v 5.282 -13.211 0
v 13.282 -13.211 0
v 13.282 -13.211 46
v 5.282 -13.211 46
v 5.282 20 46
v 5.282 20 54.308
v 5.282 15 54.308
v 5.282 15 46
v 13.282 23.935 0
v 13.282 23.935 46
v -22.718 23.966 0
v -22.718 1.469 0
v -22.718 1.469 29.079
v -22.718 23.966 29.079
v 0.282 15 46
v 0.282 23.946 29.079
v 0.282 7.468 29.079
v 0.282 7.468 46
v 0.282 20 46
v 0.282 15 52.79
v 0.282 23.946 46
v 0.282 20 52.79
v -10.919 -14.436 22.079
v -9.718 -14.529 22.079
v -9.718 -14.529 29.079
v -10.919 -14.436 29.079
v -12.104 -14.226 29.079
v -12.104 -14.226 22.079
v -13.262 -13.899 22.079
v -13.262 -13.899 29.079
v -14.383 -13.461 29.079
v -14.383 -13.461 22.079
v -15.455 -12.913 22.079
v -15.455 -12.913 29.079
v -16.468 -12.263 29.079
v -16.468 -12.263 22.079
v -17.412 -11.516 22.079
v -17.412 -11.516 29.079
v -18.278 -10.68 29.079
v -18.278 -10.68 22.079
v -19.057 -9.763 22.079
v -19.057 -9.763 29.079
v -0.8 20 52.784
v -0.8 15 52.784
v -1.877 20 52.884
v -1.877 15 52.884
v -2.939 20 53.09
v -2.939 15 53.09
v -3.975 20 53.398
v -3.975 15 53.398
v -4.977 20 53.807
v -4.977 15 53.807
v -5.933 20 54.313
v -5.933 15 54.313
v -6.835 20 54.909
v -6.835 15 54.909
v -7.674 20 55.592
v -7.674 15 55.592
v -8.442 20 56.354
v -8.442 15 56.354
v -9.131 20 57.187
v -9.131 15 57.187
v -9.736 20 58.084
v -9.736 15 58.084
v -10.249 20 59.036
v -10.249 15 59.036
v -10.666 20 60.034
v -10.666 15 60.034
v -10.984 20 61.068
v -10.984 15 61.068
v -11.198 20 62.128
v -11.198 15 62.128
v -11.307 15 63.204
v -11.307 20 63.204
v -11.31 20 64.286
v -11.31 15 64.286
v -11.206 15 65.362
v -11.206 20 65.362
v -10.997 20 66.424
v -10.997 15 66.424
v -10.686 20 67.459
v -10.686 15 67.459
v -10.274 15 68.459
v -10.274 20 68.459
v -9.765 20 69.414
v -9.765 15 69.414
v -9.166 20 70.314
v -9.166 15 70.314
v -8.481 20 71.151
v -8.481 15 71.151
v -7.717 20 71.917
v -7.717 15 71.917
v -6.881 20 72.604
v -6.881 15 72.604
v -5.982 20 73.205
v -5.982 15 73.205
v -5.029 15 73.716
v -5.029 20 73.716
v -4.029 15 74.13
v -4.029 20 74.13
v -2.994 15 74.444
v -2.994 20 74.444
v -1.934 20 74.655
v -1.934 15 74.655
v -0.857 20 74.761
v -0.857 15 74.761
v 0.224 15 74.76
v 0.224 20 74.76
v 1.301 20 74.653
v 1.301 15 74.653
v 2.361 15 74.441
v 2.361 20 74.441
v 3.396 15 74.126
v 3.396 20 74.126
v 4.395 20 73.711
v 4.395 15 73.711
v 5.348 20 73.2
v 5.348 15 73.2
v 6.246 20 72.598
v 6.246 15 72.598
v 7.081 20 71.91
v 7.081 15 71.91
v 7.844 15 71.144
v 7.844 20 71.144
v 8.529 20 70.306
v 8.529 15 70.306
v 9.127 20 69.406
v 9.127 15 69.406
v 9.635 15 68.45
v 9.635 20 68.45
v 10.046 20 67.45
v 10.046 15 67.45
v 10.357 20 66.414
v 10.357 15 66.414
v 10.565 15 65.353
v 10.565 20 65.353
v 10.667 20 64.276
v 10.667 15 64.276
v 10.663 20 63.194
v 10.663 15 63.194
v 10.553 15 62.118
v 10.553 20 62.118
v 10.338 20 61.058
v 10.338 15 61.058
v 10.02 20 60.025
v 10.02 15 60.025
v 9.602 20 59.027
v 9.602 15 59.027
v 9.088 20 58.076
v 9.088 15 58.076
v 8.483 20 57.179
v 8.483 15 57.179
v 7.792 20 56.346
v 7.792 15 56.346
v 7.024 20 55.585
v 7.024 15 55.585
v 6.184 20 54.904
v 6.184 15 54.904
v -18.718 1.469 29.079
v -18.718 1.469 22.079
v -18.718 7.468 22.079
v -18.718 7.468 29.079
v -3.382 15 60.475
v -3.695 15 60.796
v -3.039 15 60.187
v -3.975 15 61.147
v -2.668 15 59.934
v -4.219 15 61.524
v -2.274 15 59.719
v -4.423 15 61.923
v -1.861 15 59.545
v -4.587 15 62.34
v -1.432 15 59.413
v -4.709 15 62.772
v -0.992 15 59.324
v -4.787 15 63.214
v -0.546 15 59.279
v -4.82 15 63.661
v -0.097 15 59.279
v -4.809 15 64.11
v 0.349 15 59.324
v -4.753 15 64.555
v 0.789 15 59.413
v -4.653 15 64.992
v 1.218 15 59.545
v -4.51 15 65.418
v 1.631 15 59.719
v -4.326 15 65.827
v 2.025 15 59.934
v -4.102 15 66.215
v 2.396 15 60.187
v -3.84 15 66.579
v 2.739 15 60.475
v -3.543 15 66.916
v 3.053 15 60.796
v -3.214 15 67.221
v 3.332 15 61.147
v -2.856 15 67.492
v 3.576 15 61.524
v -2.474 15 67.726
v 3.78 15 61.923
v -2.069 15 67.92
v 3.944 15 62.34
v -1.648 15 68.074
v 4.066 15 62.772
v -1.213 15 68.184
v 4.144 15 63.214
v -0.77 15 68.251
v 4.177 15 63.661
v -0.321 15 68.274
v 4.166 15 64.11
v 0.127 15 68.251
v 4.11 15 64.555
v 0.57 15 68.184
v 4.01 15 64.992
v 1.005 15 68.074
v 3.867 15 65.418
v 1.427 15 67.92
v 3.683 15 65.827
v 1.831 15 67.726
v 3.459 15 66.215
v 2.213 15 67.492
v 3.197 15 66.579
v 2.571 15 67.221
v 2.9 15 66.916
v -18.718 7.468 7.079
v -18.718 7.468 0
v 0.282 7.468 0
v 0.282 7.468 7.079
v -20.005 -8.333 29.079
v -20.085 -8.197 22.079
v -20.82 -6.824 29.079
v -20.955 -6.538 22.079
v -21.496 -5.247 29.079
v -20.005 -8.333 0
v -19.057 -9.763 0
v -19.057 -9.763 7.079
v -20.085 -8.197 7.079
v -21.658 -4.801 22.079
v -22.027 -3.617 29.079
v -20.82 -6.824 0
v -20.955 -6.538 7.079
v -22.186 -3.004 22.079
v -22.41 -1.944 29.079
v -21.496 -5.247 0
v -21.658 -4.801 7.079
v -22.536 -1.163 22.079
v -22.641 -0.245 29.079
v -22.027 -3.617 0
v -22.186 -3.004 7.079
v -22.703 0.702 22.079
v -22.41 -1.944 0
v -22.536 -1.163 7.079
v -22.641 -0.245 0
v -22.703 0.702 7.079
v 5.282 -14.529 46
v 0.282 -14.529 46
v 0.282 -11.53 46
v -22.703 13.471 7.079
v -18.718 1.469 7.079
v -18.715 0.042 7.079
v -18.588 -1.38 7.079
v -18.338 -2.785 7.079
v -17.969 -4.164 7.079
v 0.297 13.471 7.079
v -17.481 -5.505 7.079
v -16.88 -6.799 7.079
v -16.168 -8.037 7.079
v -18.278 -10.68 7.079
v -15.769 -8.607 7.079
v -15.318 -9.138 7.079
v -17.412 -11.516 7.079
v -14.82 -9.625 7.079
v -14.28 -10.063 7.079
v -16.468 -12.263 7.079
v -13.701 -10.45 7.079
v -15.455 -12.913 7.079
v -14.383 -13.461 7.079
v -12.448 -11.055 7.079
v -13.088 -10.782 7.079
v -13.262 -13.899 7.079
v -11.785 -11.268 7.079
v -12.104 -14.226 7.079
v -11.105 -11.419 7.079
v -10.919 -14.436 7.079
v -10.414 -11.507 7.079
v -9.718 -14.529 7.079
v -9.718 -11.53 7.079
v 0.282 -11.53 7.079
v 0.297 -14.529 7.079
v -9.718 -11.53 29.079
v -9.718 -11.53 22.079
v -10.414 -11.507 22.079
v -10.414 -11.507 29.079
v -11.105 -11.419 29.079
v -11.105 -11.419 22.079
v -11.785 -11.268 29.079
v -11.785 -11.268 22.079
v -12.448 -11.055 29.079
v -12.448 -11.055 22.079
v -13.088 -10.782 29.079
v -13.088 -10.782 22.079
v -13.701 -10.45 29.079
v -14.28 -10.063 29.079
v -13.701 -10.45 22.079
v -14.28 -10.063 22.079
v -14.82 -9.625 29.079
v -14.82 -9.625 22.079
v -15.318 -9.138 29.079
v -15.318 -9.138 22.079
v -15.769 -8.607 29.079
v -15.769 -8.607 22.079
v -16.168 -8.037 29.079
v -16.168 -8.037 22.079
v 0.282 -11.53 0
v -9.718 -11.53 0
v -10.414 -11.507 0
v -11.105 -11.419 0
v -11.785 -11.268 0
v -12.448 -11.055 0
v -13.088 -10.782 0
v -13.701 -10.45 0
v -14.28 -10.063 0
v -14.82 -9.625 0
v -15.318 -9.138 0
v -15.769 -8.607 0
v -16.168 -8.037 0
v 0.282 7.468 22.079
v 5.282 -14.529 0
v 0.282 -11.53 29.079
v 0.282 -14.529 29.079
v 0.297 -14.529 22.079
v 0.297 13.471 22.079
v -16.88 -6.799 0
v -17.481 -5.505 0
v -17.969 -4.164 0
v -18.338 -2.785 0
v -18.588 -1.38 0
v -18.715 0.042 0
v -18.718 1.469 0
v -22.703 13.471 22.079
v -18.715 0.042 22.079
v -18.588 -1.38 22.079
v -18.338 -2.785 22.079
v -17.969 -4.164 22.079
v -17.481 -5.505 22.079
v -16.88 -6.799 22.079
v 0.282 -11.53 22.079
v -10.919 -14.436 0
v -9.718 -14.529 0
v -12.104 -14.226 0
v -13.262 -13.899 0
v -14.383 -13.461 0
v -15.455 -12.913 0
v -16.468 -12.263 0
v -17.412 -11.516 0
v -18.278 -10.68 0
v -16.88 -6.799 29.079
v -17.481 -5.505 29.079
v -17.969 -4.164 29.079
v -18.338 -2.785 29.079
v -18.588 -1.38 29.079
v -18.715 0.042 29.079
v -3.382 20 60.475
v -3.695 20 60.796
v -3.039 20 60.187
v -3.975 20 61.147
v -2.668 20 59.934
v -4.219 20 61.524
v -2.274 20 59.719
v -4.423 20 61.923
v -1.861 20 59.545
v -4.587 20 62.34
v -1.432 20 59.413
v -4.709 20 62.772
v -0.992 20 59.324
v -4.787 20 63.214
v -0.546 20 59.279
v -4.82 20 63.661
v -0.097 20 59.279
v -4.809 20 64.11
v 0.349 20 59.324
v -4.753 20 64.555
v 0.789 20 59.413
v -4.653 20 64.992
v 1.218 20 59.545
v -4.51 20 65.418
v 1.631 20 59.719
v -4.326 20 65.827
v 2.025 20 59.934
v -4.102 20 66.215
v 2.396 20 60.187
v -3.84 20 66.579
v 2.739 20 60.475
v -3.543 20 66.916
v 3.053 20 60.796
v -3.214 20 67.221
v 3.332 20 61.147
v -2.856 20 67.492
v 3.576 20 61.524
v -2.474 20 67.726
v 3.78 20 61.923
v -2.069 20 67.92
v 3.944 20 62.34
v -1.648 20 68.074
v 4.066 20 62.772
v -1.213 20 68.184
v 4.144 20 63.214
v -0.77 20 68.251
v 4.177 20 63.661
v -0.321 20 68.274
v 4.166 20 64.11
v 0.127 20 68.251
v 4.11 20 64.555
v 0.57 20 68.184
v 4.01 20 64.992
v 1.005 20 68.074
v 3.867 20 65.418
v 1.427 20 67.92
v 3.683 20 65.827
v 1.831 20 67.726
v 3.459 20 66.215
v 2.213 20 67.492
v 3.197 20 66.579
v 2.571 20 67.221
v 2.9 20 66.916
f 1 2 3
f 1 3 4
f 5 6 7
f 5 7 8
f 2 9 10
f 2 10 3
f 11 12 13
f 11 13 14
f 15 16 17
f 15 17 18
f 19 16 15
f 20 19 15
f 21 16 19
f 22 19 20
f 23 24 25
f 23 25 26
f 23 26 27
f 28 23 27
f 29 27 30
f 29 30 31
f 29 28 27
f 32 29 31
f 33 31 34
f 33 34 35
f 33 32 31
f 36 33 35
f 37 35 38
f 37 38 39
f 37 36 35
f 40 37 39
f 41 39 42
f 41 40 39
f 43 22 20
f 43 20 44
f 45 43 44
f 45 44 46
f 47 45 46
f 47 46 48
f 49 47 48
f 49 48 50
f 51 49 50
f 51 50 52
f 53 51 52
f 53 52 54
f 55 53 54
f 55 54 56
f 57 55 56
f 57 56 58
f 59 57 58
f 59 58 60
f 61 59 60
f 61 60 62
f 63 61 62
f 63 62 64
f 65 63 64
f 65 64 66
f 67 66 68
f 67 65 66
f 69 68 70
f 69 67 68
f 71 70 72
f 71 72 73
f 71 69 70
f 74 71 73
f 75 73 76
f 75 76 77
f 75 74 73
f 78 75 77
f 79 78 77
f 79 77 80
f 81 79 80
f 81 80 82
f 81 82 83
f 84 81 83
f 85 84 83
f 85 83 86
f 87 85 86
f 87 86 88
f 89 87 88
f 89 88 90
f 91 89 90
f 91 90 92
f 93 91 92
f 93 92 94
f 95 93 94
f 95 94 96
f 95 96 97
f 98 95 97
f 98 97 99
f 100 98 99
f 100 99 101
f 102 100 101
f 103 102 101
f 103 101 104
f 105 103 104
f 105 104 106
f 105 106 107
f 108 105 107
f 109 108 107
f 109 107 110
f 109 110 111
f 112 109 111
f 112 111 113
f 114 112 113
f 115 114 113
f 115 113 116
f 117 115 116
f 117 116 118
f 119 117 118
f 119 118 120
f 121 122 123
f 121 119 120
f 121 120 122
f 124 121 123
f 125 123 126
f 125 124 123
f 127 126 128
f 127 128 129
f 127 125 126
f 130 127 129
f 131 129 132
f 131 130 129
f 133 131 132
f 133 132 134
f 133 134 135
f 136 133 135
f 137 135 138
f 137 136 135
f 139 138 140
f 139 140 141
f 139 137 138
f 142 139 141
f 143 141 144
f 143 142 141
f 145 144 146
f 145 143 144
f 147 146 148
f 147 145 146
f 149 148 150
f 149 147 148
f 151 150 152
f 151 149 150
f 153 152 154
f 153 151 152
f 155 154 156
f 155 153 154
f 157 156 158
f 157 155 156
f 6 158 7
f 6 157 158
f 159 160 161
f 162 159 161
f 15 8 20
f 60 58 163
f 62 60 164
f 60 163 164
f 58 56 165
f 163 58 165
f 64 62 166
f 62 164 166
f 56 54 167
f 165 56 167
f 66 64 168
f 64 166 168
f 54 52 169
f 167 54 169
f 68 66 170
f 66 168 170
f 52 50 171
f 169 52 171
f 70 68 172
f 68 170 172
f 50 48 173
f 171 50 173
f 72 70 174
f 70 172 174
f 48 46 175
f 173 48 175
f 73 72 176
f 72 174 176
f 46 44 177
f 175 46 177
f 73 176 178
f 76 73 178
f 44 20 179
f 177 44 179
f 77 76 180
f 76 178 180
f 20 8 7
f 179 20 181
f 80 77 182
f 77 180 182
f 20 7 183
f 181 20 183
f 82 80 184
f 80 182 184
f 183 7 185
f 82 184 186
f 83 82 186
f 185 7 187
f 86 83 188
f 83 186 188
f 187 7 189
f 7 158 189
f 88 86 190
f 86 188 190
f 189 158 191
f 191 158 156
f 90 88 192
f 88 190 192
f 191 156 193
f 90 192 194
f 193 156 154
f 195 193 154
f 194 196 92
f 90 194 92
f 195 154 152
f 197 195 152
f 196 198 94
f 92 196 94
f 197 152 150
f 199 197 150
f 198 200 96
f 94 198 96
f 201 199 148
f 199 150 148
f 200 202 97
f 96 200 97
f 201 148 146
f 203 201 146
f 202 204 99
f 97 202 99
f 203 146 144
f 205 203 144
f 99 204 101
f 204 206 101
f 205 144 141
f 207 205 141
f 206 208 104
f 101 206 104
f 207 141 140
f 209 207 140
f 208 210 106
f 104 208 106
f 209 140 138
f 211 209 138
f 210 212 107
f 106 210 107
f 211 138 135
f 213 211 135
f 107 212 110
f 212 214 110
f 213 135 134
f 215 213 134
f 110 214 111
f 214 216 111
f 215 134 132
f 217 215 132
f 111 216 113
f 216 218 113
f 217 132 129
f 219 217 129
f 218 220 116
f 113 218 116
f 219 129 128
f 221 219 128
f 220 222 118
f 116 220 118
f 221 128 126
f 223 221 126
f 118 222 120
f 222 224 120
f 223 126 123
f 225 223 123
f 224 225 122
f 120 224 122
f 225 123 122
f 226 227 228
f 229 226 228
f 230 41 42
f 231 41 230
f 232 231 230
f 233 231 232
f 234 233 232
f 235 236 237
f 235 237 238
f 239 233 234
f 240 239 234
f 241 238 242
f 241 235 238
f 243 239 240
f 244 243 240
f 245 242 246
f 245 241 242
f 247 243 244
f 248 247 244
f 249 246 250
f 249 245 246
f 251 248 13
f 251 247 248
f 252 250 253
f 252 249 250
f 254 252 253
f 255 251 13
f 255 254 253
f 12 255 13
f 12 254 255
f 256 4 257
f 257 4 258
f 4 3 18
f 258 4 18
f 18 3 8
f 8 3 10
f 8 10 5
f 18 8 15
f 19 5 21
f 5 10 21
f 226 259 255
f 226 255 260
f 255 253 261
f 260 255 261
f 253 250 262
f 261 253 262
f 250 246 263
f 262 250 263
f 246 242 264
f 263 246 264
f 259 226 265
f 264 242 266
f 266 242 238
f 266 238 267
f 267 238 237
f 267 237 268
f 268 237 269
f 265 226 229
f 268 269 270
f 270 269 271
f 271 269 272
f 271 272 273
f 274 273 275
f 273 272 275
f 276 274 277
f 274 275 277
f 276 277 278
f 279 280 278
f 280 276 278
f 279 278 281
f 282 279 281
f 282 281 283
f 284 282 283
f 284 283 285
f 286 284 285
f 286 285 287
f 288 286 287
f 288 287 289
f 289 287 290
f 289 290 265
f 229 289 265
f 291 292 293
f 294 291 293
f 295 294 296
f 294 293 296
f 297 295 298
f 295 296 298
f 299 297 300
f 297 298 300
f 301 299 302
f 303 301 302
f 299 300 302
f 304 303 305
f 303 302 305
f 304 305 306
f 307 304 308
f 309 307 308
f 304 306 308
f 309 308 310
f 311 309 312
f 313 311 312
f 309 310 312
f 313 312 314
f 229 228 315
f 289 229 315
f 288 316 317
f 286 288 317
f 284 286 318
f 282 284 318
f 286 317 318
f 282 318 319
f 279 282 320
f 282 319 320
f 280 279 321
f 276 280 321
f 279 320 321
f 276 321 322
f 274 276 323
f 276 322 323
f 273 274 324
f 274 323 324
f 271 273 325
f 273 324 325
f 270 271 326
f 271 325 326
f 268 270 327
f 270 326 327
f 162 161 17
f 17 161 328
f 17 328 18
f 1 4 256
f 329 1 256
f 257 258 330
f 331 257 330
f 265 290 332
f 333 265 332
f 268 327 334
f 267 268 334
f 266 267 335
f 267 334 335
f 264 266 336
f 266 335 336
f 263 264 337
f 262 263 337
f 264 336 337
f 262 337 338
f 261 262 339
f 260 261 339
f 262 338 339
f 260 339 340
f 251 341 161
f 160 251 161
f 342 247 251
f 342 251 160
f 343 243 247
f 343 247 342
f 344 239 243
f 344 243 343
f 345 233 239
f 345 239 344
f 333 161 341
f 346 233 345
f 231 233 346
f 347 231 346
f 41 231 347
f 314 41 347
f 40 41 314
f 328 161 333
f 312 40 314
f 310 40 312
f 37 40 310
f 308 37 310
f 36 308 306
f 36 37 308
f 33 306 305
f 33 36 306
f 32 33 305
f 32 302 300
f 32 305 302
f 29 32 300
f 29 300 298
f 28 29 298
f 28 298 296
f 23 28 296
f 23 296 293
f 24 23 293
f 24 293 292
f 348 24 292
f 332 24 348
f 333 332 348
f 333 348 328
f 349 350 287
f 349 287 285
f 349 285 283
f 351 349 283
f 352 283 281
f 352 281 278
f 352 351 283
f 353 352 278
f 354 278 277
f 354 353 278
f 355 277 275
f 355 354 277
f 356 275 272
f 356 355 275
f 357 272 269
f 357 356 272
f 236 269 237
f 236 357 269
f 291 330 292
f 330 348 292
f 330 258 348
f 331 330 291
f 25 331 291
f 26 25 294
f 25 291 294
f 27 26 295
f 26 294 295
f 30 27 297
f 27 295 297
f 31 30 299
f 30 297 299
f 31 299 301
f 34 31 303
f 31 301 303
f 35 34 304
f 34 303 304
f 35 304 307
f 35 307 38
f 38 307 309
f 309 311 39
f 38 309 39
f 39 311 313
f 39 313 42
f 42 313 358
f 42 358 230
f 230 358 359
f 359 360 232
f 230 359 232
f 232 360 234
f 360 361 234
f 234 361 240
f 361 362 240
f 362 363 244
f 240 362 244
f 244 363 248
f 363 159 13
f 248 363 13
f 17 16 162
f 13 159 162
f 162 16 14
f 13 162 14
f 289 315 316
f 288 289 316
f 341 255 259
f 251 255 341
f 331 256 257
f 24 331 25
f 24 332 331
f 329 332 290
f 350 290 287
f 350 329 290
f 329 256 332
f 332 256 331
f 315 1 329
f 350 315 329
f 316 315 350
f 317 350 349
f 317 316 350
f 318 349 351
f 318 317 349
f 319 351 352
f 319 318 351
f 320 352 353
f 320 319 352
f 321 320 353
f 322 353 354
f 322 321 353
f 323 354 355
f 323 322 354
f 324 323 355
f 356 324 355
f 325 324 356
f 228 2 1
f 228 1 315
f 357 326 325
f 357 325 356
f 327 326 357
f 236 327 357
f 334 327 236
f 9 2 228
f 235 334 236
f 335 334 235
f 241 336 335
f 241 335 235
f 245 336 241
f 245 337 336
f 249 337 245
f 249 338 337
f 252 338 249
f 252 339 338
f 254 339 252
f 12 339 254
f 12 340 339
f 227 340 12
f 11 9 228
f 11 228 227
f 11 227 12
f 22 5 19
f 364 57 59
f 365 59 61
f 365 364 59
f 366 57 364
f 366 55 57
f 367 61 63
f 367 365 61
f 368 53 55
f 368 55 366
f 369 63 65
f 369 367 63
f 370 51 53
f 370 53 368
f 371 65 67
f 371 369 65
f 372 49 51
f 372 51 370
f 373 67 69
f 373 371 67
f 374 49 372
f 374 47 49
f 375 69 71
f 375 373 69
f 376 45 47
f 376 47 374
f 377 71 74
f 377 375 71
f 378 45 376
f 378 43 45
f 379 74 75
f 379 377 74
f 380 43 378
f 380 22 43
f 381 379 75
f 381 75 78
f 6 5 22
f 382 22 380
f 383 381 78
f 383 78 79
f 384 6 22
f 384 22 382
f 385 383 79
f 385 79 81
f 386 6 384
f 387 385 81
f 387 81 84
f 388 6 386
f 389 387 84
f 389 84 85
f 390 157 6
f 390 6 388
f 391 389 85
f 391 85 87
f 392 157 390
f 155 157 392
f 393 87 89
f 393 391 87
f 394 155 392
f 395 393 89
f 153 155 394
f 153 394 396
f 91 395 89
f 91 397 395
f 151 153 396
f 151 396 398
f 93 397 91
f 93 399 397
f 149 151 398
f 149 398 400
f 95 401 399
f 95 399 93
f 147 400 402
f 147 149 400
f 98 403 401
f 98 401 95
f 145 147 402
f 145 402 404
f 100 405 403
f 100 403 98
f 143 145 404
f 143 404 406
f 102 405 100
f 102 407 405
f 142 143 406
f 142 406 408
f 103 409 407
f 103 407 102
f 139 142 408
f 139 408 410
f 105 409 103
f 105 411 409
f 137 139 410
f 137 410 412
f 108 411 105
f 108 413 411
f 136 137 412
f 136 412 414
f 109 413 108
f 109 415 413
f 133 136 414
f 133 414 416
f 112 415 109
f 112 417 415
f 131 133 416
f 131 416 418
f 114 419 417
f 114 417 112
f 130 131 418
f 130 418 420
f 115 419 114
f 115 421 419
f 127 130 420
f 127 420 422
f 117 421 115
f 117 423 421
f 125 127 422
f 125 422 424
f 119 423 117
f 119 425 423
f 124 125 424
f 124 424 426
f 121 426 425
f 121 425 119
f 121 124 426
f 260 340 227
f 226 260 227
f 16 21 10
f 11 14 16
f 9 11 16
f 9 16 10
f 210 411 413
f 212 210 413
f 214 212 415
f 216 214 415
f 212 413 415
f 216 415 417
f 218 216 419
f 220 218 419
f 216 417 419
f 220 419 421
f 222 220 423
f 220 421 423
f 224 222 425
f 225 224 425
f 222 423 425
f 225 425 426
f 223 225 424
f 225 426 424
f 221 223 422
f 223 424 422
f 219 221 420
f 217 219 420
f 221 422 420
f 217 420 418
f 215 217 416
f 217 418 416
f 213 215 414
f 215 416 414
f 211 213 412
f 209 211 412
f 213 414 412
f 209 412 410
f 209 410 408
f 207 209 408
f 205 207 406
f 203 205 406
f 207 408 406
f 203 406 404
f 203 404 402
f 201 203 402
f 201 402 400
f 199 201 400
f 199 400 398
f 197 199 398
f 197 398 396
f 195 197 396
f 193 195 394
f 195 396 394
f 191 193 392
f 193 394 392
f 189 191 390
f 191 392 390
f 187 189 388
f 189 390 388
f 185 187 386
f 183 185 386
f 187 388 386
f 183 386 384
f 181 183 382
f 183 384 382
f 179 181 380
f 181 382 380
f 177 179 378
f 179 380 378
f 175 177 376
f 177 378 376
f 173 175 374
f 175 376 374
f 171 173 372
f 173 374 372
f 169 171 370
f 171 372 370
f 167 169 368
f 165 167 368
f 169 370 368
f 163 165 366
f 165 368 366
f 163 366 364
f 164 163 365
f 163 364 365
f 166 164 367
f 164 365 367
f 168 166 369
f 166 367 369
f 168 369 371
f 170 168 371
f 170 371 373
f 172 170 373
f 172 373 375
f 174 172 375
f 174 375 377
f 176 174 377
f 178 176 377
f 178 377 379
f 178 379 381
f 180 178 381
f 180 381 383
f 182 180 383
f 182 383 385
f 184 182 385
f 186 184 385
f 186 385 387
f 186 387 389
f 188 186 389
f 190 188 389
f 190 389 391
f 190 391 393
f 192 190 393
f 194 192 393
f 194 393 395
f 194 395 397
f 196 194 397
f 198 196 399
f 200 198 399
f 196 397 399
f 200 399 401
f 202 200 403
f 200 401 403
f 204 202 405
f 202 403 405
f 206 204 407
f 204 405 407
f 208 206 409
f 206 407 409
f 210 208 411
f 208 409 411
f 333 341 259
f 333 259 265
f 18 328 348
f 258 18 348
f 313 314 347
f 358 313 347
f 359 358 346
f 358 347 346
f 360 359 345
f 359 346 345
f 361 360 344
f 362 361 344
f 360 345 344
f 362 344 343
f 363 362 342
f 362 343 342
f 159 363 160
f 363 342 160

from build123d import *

# Parameters (mm, degrees)
BOSS_EXTRUDE1_DEPTH     = 46
SKETCH3_W               = 23
SKETCH3_H               = 15
CUT_EXTRUDE2_DEPTH      = 28
CUT_EXTRUDE6_DEPTH      = 40
CUT_EXTRUDE6_DEPTH_BACK = 30
SKETCH10_W              = 22.999996183
SKETCH10_H              = 16.921181255
SKETCH7_R               = 11
SKETCH7_R_2             = 4.5
BOSS_EXTRUDE2_DEPTH     = 5
BOSS_EXTRUDE3_DEPTH     = 5


with BuildPart() as part:
    # Sketch1 → Boss-Extrude1 (new body)
    with BuildSketch(Plane.XY):
        with BuildLine():
            Line((-22.718454064, 23.966100395), (13.281542119, 23.93479699))
            Line((13.281542119, 23.93479699), (13.281542119, -13.210798183))
            Line((13.281542119, -13.210798183), (5.281545459, -13.210798183))
            Line((5.281545459, -13.210798183), (5.281545459, -14.529188453))
            Line((5.281545459, -14.529188453), (-9.718454064, -14.529188453))
            ThreePointArc((-9.718454064, -14.529188453), (-14.925713646, -13.200176165), (-19.056981743, -9.762960731))
            ThreePointArc((-19.056981743, -9.762960731), (-21.779979177, -4.437922335), (-22.718454064, 1.468854607))
            Line((-22.718454064, 1.468854607), (-22.718454064, 23.966100395))
        make_face()
        with BuildLine():
            Line((-18.718455971, 7.468114556), (0.281544029, 7.468114556))
            Line((0.281544029, 7.468114556), (0.281544029, -11.529558479))
            Line((0.281544029, -11.529558479), (-9.718454064, -11.529558479))
            ThreePointArc((-9.718454064, -11.529558479), (-13.398330557, -10.623193541), (-16.168405236, -8.036752998))
            ThreePointArc((-16.168405236, -8.036752998), (-18.168441603, -3.478446477), (-18.718455971, 1.468854607))
            Line((-18.718455971, 1.468854607), (-18.718455971, 7.468114556))
        make_face(mode=Mode.SUBTRACT)
    extrude(amount=BOSS_EXTRUDE1_DEPTH)

    # Sketch3 → Cut-Extrude2 (cut)
    with BuildSketch(Plane.XZ.offset(14.529188453)):
        with Locations((-11.2030368, 14.578818745)):
            Rectangle(SKETCH3_W, SKETCH3_H)
    extrude(amount=-CUT_EXTRUDE2_DEPTH, mode=Mode.SUBTRACT)

    # Sketch10 → Cut-Extrude6 (cut, two sides: drawn at the far end of the back side and taken through both)
    with BuildSketch(Plane(origin=(0, 7.468114556, 0), x_dir=(-1, 0, 0), z_dir=(0, -1, 0)).offset(-CUT_EXTRUDE6_DEPTH_BACK)):
        with Locations((11.218455973, -37.539409373)):
            Rectangle(SKETCH10_W, SKETCH10_H)
    extrude(amount=CUT_EXTRUDE6_DEPTH + CUT_EXTRUDE6_DEPTH_BACK, mode=Mode.SUBTRACT)



with BuildPart() as body_2:
    # Sketch7 → Boss-Extrude2 (new body)
    with BuildSketch(Plane(origin=(0, 20, 0), x_dir=(1, 0, 0), z_dir=(0, 1, 0))):
        with Locations(Location((-0.321447284, -63.773621976, 0), (0, 0, 270))):
            Circle(SKETCH7_R)
        with Locations(Location((-0.321447284, -63.773621976, 0), (0, 0, 270))):
            Circle(SKETCH7_R_2, mode=Mode.SUBTRACT)
    extrude(amount=-BOSS_EXTRUDE2_DEPTH)


with BuildPart() as part_1:
    add(part.part)

    add(body_2.part)  # Boss-Extrude3 merges body 2
    # Sketch12 → Boss-Extrude3 (add)
    with BuildSketch(Plane(origin=(0, 20, 0), x_dir=(1, 0, 0), z_dir=(0, 1, 0))):
        with BuildLine():
            Line((0.281542119, -46), (0.281542119, -52.790161511))
            ThreePointArc((0.281542119, -52.790161511), (2.872949751, -53.247662277), (5.281545459, -54.307552448))
            Line((5.281545459, -54.307552448), (5.281545459, -46))
            Line((5.281545459, -46), (0.281542119, -46))
        make_face()
    extrude(amount=-BOSS_EXTRUDE3_DEPTH)


solid = part_1.part
